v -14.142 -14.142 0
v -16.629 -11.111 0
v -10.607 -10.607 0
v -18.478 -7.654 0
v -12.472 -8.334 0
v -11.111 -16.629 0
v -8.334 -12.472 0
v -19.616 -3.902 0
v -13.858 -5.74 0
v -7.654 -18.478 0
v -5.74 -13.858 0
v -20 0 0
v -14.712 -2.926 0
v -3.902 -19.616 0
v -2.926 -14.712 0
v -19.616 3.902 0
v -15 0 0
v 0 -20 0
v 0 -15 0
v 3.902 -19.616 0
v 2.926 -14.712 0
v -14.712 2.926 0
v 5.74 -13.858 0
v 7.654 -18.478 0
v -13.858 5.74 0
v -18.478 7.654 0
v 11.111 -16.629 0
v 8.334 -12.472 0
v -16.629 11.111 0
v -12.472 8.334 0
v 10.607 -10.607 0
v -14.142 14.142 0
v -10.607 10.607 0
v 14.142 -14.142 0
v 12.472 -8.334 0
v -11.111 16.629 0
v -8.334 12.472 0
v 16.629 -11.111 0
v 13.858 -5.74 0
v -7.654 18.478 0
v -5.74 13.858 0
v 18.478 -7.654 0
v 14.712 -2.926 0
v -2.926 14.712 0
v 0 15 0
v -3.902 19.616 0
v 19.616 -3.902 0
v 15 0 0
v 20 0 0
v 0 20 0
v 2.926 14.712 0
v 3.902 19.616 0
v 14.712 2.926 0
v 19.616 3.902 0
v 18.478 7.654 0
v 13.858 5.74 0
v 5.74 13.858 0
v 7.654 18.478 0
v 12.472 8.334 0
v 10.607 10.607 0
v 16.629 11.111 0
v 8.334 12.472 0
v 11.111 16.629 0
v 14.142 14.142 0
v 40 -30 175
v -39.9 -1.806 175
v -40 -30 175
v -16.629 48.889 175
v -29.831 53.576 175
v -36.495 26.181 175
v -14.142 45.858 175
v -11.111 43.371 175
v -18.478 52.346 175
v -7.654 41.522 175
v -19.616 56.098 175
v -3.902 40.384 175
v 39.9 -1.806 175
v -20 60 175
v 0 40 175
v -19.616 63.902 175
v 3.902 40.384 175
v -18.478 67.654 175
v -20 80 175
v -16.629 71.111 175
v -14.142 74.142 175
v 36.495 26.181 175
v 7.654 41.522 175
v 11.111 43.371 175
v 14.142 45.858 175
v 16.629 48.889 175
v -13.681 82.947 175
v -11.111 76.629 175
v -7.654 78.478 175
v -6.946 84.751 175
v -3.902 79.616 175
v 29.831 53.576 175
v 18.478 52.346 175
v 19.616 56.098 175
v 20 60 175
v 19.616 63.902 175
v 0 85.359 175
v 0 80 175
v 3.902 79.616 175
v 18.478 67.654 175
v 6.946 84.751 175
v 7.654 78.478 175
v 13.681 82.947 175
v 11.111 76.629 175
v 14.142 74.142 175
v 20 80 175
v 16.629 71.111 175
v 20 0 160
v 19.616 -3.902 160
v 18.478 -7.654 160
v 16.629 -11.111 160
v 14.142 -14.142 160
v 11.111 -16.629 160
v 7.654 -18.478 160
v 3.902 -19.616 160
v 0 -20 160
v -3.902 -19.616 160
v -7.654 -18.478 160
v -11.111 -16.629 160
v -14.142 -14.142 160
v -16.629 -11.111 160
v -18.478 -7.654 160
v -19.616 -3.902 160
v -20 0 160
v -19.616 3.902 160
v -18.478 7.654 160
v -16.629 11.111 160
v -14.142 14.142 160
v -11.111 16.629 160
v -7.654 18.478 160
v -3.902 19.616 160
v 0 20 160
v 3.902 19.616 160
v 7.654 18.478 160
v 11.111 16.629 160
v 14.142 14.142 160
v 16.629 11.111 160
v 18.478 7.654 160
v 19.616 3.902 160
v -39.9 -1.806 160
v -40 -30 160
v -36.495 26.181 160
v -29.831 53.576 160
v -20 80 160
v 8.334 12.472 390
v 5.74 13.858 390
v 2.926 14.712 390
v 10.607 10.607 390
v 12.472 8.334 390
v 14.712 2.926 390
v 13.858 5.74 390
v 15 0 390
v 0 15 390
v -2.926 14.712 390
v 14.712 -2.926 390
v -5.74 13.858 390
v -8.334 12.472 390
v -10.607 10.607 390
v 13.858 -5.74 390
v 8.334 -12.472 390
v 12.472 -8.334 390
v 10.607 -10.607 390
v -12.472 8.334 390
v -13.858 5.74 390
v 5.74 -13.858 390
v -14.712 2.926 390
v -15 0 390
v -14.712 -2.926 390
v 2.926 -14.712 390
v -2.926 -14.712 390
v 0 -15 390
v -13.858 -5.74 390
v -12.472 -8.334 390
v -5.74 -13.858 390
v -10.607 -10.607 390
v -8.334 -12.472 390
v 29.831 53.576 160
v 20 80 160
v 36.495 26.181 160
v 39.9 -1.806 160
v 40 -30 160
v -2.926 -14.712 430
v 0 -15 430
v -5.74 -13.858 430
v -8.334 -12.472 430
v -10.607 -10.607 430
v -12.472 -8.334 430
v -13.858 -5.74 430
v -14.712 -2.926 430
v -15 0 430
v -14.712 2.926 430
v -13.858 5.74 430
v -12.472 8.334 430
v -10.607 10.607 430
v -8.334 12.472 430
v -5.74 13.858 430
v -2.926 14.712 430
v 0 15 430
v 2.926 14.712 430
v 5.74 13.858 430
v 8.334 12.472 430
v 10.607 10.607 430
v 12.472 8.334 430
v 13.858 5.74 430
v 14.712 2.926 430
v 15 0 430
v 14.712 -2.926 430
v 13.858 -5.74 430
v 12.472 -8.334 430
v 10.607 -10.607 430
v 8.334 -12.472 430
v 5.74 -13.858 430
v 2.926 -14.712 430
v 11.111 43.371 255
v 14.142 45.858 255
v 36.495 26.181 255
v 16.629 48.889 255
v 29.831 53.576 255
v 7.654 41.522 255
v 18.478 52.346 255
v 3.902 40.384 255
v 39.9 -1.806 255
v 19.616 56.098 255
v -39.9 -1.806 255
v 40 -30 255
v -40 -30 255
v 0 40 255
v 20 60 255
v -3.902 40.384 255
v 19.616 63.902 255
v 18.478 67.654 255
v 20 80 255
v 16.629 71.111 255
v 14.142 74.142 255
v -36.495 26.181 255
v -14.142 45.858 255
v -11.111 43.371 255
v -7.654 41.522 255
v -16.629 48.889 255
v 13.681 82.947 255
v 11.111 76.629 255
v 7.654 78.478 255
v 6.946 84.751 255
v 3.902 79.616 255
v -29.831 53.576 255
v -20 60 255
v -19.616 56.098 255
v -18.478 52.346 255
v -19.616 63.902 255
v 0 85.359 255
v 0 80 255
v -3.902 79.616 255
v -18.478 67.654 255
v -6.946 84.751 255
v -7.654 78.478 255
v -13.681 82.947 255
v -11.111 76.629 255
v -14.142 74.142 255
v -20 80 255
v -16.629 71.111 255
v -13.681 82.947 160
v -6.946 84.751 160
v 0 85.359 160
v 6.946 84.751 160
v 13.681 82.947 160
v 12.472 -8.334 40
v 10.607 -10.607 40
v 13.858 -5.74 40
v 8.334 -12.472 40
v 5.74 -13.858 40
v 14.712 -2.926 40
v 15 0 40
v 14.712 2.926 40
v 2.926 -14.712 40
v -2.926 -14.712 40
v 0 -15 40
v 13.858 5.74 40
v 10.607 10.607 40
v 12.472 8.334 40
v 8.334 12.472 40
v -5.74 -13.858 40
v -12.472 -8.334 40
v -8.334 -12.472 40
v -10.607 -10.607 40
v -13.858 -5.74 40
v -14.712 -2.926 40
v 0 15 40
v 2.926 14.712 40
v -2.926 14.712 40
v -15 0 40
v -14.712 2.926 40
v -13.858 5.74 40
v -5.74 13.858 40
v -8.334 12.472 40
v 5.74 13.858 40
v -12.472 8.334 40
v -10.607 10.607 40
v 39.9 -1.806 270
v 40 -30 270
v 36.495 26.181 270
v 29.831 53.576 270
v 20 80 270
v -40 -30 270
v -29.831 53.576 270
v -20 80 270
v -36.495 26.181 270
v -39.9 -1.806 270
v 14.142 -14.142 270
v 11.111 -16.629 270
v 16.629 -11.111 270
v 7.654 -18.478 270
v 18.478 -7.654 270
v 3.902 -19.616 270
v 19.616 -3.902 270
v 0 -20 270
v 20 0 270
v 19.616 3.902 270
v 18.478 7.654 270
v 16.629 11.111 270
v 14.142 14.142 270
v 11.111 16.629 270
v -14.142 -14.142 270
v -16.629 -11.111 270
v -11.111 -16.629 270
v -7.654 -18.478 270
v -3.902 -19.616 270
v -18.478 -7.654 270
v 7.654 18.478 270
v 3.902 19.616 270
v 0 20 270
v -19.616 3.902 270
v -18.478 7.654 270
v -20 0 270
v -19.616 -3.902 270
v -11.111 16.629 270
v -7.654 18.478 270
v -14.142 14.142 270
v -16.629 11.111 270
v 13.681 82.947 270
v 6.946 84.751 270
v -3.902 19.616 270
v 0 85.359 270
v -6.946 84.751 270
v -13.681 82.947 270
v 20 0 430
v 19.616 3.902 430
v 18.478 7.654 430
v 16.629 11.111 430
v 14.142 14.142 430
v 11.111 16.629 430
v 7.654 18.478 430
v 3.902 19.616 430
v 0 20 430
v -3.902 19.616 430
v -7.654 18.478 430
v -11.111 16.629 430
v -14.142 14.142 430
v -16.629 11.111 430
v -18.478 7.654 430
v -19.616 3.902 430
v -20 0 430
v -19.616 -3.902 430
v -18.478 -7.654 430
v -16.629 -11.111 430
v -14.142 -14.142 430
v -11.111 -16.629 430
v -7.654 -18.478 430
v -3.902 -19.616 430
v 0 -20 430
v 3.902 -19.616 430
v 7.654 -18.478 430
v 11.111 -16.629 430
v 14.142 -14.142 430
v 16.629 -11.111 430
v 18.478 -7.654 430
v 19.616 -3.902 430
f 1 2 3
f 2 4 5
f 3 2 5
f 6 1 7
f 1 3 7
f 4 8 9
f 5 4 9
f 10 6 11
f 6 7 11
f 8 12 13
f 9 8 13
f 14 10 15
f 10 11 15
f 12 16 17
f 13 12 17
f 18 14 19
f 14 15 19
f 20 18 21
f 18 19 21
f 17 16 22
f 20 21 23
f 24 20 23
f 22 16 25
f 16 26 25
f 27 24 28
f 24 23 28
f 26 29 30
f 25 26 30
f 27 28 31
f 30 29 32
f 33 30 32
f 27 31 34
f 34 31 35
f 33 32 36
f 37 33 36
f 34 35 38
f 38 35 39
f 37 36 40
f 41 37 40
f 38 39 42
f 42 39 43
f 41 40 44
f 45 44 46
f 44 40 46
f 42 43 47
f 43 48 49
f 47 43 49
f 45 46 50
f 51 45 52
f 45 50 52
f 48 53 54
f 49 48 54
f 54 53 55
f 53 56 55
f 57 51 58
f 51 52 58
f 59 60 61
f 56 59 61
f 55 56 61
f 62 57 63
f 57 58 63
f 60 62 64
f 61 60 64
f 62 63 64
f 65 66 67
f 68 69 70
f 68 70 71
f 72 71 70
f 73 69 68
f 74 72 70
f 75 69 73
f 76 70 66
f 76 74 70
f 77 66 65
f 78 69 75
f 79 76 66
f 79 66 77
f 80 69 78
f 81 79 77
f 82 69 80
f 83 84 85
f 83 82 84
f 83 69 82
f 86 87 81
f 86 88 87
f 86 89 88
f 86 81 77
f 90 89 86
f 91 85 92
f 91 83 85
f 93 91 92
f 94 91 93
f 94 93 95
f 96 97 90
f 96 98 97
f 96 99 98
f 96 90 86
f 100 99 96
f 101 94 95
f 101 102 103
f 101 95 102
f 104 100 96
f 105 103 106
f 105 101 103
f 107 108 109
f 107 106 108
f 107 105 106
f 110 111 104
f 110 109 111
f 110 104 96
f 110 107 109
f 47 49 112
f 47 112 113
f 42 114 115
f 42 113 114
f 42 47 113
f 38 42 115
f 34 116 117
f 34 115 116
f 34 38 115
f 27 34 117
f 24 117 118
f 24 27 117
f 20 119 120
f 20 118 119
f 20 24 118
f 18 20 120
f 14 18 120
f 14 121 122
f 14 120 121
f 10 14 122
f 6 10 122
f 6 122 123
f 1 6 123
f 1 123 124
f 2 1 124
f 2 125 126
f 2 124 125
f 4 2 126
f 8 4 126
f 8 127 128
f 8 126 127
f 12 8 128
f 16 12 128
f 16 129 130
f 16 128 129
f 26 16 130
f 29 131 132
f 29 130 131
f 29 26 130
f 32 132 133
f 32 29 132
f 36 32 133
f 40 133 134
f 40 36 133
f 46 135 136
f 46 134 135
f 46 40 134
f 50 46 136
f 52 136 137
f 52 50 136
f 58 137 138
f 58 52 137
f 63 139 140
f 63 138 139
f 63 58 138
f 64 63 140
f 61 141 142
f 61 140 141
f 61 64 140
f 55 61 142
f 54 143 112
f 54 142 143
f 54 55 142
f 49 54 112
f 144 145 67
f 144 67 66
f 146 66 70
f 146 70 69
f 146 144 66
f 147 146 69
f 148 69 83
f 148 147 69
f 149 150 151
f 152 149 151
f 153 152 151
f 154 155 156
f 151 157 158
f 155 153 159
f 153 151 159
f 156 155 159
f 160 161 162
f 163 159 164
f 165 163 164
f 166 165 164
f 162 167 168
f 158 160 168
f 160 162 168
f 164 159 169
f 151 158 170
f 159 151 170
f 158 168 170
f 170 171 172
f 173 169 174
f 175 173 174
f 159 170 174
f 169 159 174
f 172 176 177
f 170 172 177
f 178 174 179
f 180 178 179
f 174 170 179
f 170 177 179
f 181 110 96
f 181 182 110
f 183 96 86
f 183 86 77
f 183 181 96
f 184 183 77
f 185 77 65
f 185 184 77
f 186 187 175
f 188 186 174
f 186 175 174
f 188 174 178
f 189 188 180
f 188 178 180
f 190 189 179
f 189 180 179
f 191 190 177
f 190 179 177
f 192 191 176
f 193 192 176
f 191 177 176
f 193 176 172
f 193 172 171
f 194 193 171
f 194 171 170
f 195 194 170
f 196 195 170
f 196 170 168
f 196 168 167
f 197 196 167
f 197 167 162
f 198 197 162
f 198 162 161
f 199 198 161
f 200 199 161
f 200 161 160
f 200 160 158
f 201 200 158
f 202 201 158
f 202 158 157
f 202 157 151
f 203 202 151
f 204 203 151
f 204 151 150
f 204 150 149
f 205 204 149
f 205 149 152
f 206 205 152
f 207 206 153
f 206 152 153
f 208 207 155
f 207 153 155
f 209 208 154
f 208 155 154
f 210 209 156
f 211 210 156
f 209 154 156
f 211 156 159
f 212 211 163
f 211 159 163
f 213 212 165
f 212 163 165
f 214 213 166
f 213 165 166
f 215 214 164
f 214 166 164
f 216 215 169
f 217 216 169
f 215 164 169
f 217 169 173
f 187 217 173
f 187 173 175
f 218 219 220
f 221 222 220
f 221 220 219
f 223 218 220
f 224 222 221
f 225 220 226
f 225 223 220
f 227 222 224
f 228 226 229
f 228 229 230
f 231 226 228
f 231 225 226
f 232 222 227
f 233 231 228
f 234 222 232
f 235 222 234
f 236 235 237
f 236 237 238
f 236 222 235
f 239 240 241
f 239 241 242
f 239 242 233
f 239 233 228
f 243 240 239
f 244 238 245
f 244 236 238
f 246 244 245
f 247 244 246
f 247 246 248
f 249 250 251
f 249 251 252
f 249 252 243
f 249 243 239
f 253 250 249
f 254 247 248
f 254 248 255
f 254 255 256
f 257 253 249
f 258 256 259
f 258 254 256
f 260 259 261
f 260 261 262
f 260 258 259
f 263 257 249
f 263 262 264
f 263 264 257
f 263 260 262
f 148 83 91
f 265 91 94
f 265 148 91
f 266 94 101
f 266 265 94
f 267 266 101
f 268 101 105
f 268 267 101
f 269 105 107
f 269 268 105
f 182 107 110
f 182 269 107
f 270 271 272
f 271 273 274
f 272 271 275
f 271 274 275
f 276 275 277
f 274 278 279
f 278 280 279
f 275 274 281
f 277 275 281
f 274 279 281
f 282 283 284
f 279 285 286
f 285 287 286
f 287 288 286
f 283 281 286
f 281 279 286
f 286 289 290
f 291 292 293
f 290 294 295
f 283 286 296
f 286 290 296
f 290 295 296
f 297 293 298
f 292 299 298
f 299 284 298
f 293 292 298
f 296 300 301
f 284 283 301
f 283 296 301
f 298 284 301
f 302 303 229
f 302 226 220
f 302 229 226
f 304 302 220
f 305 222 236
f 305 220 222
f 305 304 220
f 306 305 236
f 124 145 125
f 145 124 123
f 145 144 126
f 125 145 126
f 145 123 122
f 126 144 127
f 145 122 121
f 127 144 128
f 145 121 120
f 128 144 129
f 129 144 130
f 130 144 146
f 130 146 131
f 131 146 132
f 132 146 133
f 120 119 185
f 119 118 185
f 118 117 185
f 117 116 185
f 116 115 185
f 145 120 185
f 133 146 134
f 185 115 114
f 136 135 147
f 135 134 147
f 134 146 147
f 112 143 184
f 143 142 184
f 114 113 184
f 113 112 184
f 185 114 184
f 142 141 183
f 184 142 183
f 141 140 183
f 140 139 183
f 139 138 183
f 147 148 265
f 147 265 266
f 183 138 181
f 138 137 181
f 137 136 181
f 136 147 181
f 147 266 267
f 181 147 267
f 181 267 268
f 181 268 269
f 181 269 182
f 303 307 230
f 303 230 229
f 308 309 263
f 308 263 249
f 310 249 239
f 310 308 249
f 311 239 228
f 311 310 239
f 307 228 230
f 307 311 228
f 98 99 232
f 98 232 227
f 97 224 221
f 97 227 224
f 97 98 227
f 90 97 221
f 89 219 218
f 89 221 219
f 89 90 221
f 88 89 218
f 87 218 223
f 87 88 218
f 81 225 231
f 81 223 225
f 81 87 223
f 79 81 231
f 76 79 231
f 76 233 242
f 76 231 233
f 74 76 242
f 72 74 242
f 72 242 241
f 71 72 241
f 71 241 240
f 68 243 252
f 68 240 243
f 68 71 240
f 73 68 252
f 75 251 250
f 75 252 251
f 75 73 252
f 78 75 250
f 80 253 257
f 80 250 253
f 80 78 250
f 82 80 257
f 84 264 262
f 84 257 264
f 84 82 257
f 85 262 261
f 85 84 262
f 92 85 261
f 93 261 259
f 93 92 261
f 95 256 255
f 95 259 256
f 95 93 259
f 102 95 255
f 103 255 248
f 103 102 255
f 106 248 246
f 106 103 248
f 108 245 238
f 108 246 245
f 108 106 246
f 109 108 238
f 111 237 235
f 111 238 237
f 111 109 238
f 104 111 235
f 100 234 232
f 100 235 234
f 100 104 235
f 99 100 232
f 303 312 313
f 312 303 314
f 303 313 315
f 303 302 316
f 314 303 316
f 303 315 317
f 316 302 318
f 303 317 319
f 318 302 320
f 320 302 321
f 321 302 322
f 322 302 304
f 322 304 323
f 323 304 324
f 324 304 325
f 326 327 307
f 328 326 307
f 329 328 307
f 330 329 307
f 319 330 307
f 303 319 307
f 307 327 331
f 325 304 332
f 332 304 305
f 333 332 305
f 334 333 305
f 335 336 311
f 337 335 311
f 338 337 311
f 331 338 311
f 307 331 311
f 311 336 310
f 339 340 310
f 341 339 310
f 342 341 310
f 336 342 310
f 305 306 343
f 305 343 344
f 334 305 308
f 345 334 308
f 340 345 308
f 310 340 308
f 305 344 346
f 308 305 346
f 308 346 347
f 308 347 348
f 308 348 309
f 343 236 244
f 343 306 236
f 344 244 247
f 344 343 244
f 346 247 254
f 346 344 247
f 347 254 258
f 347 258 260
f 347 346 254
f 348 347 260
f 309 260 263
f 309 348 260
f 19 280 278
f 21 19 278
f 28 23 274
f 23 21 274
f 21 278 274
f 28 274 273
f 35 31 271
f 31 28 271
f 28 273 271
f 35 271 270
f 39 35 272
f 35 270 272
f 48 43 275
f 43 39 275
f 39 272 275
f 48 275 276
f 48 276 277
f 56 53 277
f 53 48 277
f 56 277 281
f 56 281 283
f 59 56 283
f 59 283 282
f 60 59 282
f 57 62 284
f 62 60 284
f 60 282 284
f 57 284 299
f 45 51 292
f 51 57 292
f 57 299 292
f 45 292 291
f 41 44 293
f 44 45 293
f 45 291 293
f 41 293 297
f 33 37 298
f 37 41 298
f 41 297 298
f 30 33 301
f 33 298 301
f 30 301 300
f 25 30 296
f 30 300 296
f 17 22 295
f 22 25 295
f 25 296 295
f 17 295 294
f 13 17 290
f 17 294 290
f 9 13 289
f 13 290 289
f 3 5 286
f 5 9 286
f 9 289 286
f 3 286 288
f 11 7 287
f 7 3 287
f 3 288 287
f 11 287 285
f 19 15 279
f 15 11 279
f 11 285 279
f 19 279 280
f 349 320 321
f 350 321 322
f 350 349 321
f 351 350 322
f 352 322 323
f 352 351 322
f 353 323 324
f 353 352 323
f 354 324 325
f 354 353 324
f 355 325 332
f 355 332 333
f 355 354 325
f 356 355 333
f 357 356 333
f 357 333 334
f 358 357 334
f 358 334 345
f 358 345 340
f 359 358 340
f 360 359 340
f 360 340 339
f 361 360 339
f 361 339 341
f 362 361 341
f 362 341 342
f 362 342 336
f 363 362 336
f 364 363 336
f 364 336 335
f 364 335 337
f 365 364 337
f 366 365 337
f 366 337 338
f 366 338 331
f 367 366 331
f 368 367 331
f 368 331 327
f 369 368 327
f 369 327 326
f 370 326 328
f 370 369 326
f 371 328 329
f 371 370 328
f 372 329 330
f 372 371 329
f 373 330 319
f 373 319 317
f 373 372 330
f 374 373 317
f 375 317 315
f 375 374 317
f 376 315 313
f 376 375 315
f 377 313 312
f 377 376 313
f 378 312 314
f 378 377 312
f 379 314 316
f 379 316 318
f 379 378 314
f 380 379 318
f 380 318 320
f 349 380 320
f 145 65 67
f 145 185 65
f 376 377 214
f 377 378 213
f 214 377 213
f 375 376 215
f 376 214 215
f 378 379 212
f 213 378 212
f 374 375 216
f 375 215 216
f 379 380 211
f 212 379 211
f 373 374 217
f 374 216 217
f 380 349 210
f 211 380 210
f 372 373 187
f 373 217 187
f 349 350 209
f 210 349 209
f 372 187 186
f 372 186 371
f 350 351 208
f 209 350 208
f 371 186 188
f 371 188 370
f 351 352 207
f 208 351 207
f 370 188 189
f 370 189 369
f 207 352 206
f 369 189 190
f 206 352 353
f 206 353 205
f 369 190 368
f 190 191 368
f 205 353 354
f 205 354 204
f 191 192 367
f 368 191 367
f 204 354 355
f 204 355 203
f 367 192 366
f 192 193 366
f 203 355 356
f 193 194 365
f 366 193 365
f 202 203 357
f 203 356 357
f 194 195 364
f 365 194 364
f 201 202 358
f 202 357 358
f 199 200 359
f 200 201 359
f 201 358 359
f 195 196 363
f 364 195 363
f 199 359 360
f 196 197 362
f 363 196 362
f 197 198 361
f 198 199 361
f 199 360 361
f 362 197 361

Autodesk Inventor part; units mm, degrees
ref_plane "YZ Plane" through (0, 0, 0) normal (1, 0, 0) x (0, 1, 0)
ref_plane "XZ Plane" through (0, 0, 0) normal (0, 1, 0) x (-1, 0, 0)
ref_plane "XY Plane" through (0, 0, 0) normal (0, 0, 1) x (1, 0, 0)
sketch "草图1" plane through (0, 0, 0) normal (0, 0, 1) x (1, 0, 0)
  circle A0 centre (0, 0) radius 20
  dimension "d0" = 40
extrude "拉伸1" add sketch "草图1" along normal blind 160
sketch "草图2" plane through (0, 0, 160) normal (0, 0, 1) x (1, 0, 0)
  line L0 (-40, 0) -> (40, 0)
  line L1 (40, 0) -> (40, -30) construction
  line L2 (40, -30) -> (-40, -30)
  line L3 (-40, -30) -> (-40, 0) construction
  circle A0 centre (0, 0) radius 20 projected
  line L4 (-20, 80) -> (20, 80)
  line L5 (20, 80) -> (20, -30)
  line L6 (20, -30) -> (-20, -30)
  line L7 (-20, -30) -> (-20, 80)
  line L8 (-20, 80) -> (-40, -30)
  line L9 (0, 0) -> (0, 63.2823)
  line L10 (20, 80) -> (40, -30)
  arc A1 (-20, 80) -> (-40, -30) centre (199.6341, -16.7516) ccw
  arc A2 (40, -30) -> (20, 80) centre (-199.6341, -16.7516) ccw
  arc A3 (20, 80) -> (-20, 80) centre (0, 45.359) ccw
  circle A4 centre (0, 120.4047) radius 25
  circle A5 centre (0, 0) radius 75
  line L11 (2.3516, 185.7586) -> (-119.2479, -80.6225)
  point P0 (0, -30)
  dimension "d3" = 80
  dimension "d4" = 30
  dimension "d5" = 40
  dimension "d6" = 110
  dimension "d7" = 20
  dimension "d8" = 110
  dimension "d9" = 240
  dimension "d10" = 40
  dimension "d24" = 50
  dimension "d25" = 150
extrude "拉伸2" add sketch "草图2" along normal blind 15 contours L9 A0 L0 | L0 A0 | L0 A0 L9 | L5 A5 L10 L0 | L5 L2 L7 A0 | L0 L10 L2 L5 | A0 L7 A5 L5 | L7 L2 L8 L0 | L0 L8 A5 L7 | L10 A5 A2 L0 | L0 A2 L10 | A5 L7 L4 L5 | L5 L10 A5 | L8 A1 L0 | L0 A1 A5 L8 | A5 L8 L7 | L10 A2 A5 | L4 A3 | A5 A1 L8
sketch "草图3" plane through (0, 0, 175) normal (0, 0, 1) x (1, 0, 0)
  circle A0 centre (0, 60) radius 20
  point P0 (0, 0)
  dimension "d13" = 40
  dimension "d14" = 60
extrude "拉伸3" add sketch "草图3" along normal blind 80
ref_plane "工作平面1" through (0, 60, 215) normal (0, 0, 1) x (1, 0, 0)
mirror "镜像1" about plane through (0, 60, 215) normal (0, 0, 1) of "拉伸2"
mirror "镜像2" about plane through (0, 60, 215) normal (0, 0, 1) of "拉伸1"
sketch "草图4" plane through (0, 0, 430) normal (0, 0, 1) x (1, 0, 0)
  circle A0 centre (0, 0) radius 20 projected
hole "孔1" at (0, 0, 430) direction (0, 0, -1) diameter 30 depth 40
mirror "镜像3" about plane through (0, 60, 215) normal (0, 0, 1) of "孔1"
equation "\"d8\" = 5.5 * d7"
properties part number "曲轴"
